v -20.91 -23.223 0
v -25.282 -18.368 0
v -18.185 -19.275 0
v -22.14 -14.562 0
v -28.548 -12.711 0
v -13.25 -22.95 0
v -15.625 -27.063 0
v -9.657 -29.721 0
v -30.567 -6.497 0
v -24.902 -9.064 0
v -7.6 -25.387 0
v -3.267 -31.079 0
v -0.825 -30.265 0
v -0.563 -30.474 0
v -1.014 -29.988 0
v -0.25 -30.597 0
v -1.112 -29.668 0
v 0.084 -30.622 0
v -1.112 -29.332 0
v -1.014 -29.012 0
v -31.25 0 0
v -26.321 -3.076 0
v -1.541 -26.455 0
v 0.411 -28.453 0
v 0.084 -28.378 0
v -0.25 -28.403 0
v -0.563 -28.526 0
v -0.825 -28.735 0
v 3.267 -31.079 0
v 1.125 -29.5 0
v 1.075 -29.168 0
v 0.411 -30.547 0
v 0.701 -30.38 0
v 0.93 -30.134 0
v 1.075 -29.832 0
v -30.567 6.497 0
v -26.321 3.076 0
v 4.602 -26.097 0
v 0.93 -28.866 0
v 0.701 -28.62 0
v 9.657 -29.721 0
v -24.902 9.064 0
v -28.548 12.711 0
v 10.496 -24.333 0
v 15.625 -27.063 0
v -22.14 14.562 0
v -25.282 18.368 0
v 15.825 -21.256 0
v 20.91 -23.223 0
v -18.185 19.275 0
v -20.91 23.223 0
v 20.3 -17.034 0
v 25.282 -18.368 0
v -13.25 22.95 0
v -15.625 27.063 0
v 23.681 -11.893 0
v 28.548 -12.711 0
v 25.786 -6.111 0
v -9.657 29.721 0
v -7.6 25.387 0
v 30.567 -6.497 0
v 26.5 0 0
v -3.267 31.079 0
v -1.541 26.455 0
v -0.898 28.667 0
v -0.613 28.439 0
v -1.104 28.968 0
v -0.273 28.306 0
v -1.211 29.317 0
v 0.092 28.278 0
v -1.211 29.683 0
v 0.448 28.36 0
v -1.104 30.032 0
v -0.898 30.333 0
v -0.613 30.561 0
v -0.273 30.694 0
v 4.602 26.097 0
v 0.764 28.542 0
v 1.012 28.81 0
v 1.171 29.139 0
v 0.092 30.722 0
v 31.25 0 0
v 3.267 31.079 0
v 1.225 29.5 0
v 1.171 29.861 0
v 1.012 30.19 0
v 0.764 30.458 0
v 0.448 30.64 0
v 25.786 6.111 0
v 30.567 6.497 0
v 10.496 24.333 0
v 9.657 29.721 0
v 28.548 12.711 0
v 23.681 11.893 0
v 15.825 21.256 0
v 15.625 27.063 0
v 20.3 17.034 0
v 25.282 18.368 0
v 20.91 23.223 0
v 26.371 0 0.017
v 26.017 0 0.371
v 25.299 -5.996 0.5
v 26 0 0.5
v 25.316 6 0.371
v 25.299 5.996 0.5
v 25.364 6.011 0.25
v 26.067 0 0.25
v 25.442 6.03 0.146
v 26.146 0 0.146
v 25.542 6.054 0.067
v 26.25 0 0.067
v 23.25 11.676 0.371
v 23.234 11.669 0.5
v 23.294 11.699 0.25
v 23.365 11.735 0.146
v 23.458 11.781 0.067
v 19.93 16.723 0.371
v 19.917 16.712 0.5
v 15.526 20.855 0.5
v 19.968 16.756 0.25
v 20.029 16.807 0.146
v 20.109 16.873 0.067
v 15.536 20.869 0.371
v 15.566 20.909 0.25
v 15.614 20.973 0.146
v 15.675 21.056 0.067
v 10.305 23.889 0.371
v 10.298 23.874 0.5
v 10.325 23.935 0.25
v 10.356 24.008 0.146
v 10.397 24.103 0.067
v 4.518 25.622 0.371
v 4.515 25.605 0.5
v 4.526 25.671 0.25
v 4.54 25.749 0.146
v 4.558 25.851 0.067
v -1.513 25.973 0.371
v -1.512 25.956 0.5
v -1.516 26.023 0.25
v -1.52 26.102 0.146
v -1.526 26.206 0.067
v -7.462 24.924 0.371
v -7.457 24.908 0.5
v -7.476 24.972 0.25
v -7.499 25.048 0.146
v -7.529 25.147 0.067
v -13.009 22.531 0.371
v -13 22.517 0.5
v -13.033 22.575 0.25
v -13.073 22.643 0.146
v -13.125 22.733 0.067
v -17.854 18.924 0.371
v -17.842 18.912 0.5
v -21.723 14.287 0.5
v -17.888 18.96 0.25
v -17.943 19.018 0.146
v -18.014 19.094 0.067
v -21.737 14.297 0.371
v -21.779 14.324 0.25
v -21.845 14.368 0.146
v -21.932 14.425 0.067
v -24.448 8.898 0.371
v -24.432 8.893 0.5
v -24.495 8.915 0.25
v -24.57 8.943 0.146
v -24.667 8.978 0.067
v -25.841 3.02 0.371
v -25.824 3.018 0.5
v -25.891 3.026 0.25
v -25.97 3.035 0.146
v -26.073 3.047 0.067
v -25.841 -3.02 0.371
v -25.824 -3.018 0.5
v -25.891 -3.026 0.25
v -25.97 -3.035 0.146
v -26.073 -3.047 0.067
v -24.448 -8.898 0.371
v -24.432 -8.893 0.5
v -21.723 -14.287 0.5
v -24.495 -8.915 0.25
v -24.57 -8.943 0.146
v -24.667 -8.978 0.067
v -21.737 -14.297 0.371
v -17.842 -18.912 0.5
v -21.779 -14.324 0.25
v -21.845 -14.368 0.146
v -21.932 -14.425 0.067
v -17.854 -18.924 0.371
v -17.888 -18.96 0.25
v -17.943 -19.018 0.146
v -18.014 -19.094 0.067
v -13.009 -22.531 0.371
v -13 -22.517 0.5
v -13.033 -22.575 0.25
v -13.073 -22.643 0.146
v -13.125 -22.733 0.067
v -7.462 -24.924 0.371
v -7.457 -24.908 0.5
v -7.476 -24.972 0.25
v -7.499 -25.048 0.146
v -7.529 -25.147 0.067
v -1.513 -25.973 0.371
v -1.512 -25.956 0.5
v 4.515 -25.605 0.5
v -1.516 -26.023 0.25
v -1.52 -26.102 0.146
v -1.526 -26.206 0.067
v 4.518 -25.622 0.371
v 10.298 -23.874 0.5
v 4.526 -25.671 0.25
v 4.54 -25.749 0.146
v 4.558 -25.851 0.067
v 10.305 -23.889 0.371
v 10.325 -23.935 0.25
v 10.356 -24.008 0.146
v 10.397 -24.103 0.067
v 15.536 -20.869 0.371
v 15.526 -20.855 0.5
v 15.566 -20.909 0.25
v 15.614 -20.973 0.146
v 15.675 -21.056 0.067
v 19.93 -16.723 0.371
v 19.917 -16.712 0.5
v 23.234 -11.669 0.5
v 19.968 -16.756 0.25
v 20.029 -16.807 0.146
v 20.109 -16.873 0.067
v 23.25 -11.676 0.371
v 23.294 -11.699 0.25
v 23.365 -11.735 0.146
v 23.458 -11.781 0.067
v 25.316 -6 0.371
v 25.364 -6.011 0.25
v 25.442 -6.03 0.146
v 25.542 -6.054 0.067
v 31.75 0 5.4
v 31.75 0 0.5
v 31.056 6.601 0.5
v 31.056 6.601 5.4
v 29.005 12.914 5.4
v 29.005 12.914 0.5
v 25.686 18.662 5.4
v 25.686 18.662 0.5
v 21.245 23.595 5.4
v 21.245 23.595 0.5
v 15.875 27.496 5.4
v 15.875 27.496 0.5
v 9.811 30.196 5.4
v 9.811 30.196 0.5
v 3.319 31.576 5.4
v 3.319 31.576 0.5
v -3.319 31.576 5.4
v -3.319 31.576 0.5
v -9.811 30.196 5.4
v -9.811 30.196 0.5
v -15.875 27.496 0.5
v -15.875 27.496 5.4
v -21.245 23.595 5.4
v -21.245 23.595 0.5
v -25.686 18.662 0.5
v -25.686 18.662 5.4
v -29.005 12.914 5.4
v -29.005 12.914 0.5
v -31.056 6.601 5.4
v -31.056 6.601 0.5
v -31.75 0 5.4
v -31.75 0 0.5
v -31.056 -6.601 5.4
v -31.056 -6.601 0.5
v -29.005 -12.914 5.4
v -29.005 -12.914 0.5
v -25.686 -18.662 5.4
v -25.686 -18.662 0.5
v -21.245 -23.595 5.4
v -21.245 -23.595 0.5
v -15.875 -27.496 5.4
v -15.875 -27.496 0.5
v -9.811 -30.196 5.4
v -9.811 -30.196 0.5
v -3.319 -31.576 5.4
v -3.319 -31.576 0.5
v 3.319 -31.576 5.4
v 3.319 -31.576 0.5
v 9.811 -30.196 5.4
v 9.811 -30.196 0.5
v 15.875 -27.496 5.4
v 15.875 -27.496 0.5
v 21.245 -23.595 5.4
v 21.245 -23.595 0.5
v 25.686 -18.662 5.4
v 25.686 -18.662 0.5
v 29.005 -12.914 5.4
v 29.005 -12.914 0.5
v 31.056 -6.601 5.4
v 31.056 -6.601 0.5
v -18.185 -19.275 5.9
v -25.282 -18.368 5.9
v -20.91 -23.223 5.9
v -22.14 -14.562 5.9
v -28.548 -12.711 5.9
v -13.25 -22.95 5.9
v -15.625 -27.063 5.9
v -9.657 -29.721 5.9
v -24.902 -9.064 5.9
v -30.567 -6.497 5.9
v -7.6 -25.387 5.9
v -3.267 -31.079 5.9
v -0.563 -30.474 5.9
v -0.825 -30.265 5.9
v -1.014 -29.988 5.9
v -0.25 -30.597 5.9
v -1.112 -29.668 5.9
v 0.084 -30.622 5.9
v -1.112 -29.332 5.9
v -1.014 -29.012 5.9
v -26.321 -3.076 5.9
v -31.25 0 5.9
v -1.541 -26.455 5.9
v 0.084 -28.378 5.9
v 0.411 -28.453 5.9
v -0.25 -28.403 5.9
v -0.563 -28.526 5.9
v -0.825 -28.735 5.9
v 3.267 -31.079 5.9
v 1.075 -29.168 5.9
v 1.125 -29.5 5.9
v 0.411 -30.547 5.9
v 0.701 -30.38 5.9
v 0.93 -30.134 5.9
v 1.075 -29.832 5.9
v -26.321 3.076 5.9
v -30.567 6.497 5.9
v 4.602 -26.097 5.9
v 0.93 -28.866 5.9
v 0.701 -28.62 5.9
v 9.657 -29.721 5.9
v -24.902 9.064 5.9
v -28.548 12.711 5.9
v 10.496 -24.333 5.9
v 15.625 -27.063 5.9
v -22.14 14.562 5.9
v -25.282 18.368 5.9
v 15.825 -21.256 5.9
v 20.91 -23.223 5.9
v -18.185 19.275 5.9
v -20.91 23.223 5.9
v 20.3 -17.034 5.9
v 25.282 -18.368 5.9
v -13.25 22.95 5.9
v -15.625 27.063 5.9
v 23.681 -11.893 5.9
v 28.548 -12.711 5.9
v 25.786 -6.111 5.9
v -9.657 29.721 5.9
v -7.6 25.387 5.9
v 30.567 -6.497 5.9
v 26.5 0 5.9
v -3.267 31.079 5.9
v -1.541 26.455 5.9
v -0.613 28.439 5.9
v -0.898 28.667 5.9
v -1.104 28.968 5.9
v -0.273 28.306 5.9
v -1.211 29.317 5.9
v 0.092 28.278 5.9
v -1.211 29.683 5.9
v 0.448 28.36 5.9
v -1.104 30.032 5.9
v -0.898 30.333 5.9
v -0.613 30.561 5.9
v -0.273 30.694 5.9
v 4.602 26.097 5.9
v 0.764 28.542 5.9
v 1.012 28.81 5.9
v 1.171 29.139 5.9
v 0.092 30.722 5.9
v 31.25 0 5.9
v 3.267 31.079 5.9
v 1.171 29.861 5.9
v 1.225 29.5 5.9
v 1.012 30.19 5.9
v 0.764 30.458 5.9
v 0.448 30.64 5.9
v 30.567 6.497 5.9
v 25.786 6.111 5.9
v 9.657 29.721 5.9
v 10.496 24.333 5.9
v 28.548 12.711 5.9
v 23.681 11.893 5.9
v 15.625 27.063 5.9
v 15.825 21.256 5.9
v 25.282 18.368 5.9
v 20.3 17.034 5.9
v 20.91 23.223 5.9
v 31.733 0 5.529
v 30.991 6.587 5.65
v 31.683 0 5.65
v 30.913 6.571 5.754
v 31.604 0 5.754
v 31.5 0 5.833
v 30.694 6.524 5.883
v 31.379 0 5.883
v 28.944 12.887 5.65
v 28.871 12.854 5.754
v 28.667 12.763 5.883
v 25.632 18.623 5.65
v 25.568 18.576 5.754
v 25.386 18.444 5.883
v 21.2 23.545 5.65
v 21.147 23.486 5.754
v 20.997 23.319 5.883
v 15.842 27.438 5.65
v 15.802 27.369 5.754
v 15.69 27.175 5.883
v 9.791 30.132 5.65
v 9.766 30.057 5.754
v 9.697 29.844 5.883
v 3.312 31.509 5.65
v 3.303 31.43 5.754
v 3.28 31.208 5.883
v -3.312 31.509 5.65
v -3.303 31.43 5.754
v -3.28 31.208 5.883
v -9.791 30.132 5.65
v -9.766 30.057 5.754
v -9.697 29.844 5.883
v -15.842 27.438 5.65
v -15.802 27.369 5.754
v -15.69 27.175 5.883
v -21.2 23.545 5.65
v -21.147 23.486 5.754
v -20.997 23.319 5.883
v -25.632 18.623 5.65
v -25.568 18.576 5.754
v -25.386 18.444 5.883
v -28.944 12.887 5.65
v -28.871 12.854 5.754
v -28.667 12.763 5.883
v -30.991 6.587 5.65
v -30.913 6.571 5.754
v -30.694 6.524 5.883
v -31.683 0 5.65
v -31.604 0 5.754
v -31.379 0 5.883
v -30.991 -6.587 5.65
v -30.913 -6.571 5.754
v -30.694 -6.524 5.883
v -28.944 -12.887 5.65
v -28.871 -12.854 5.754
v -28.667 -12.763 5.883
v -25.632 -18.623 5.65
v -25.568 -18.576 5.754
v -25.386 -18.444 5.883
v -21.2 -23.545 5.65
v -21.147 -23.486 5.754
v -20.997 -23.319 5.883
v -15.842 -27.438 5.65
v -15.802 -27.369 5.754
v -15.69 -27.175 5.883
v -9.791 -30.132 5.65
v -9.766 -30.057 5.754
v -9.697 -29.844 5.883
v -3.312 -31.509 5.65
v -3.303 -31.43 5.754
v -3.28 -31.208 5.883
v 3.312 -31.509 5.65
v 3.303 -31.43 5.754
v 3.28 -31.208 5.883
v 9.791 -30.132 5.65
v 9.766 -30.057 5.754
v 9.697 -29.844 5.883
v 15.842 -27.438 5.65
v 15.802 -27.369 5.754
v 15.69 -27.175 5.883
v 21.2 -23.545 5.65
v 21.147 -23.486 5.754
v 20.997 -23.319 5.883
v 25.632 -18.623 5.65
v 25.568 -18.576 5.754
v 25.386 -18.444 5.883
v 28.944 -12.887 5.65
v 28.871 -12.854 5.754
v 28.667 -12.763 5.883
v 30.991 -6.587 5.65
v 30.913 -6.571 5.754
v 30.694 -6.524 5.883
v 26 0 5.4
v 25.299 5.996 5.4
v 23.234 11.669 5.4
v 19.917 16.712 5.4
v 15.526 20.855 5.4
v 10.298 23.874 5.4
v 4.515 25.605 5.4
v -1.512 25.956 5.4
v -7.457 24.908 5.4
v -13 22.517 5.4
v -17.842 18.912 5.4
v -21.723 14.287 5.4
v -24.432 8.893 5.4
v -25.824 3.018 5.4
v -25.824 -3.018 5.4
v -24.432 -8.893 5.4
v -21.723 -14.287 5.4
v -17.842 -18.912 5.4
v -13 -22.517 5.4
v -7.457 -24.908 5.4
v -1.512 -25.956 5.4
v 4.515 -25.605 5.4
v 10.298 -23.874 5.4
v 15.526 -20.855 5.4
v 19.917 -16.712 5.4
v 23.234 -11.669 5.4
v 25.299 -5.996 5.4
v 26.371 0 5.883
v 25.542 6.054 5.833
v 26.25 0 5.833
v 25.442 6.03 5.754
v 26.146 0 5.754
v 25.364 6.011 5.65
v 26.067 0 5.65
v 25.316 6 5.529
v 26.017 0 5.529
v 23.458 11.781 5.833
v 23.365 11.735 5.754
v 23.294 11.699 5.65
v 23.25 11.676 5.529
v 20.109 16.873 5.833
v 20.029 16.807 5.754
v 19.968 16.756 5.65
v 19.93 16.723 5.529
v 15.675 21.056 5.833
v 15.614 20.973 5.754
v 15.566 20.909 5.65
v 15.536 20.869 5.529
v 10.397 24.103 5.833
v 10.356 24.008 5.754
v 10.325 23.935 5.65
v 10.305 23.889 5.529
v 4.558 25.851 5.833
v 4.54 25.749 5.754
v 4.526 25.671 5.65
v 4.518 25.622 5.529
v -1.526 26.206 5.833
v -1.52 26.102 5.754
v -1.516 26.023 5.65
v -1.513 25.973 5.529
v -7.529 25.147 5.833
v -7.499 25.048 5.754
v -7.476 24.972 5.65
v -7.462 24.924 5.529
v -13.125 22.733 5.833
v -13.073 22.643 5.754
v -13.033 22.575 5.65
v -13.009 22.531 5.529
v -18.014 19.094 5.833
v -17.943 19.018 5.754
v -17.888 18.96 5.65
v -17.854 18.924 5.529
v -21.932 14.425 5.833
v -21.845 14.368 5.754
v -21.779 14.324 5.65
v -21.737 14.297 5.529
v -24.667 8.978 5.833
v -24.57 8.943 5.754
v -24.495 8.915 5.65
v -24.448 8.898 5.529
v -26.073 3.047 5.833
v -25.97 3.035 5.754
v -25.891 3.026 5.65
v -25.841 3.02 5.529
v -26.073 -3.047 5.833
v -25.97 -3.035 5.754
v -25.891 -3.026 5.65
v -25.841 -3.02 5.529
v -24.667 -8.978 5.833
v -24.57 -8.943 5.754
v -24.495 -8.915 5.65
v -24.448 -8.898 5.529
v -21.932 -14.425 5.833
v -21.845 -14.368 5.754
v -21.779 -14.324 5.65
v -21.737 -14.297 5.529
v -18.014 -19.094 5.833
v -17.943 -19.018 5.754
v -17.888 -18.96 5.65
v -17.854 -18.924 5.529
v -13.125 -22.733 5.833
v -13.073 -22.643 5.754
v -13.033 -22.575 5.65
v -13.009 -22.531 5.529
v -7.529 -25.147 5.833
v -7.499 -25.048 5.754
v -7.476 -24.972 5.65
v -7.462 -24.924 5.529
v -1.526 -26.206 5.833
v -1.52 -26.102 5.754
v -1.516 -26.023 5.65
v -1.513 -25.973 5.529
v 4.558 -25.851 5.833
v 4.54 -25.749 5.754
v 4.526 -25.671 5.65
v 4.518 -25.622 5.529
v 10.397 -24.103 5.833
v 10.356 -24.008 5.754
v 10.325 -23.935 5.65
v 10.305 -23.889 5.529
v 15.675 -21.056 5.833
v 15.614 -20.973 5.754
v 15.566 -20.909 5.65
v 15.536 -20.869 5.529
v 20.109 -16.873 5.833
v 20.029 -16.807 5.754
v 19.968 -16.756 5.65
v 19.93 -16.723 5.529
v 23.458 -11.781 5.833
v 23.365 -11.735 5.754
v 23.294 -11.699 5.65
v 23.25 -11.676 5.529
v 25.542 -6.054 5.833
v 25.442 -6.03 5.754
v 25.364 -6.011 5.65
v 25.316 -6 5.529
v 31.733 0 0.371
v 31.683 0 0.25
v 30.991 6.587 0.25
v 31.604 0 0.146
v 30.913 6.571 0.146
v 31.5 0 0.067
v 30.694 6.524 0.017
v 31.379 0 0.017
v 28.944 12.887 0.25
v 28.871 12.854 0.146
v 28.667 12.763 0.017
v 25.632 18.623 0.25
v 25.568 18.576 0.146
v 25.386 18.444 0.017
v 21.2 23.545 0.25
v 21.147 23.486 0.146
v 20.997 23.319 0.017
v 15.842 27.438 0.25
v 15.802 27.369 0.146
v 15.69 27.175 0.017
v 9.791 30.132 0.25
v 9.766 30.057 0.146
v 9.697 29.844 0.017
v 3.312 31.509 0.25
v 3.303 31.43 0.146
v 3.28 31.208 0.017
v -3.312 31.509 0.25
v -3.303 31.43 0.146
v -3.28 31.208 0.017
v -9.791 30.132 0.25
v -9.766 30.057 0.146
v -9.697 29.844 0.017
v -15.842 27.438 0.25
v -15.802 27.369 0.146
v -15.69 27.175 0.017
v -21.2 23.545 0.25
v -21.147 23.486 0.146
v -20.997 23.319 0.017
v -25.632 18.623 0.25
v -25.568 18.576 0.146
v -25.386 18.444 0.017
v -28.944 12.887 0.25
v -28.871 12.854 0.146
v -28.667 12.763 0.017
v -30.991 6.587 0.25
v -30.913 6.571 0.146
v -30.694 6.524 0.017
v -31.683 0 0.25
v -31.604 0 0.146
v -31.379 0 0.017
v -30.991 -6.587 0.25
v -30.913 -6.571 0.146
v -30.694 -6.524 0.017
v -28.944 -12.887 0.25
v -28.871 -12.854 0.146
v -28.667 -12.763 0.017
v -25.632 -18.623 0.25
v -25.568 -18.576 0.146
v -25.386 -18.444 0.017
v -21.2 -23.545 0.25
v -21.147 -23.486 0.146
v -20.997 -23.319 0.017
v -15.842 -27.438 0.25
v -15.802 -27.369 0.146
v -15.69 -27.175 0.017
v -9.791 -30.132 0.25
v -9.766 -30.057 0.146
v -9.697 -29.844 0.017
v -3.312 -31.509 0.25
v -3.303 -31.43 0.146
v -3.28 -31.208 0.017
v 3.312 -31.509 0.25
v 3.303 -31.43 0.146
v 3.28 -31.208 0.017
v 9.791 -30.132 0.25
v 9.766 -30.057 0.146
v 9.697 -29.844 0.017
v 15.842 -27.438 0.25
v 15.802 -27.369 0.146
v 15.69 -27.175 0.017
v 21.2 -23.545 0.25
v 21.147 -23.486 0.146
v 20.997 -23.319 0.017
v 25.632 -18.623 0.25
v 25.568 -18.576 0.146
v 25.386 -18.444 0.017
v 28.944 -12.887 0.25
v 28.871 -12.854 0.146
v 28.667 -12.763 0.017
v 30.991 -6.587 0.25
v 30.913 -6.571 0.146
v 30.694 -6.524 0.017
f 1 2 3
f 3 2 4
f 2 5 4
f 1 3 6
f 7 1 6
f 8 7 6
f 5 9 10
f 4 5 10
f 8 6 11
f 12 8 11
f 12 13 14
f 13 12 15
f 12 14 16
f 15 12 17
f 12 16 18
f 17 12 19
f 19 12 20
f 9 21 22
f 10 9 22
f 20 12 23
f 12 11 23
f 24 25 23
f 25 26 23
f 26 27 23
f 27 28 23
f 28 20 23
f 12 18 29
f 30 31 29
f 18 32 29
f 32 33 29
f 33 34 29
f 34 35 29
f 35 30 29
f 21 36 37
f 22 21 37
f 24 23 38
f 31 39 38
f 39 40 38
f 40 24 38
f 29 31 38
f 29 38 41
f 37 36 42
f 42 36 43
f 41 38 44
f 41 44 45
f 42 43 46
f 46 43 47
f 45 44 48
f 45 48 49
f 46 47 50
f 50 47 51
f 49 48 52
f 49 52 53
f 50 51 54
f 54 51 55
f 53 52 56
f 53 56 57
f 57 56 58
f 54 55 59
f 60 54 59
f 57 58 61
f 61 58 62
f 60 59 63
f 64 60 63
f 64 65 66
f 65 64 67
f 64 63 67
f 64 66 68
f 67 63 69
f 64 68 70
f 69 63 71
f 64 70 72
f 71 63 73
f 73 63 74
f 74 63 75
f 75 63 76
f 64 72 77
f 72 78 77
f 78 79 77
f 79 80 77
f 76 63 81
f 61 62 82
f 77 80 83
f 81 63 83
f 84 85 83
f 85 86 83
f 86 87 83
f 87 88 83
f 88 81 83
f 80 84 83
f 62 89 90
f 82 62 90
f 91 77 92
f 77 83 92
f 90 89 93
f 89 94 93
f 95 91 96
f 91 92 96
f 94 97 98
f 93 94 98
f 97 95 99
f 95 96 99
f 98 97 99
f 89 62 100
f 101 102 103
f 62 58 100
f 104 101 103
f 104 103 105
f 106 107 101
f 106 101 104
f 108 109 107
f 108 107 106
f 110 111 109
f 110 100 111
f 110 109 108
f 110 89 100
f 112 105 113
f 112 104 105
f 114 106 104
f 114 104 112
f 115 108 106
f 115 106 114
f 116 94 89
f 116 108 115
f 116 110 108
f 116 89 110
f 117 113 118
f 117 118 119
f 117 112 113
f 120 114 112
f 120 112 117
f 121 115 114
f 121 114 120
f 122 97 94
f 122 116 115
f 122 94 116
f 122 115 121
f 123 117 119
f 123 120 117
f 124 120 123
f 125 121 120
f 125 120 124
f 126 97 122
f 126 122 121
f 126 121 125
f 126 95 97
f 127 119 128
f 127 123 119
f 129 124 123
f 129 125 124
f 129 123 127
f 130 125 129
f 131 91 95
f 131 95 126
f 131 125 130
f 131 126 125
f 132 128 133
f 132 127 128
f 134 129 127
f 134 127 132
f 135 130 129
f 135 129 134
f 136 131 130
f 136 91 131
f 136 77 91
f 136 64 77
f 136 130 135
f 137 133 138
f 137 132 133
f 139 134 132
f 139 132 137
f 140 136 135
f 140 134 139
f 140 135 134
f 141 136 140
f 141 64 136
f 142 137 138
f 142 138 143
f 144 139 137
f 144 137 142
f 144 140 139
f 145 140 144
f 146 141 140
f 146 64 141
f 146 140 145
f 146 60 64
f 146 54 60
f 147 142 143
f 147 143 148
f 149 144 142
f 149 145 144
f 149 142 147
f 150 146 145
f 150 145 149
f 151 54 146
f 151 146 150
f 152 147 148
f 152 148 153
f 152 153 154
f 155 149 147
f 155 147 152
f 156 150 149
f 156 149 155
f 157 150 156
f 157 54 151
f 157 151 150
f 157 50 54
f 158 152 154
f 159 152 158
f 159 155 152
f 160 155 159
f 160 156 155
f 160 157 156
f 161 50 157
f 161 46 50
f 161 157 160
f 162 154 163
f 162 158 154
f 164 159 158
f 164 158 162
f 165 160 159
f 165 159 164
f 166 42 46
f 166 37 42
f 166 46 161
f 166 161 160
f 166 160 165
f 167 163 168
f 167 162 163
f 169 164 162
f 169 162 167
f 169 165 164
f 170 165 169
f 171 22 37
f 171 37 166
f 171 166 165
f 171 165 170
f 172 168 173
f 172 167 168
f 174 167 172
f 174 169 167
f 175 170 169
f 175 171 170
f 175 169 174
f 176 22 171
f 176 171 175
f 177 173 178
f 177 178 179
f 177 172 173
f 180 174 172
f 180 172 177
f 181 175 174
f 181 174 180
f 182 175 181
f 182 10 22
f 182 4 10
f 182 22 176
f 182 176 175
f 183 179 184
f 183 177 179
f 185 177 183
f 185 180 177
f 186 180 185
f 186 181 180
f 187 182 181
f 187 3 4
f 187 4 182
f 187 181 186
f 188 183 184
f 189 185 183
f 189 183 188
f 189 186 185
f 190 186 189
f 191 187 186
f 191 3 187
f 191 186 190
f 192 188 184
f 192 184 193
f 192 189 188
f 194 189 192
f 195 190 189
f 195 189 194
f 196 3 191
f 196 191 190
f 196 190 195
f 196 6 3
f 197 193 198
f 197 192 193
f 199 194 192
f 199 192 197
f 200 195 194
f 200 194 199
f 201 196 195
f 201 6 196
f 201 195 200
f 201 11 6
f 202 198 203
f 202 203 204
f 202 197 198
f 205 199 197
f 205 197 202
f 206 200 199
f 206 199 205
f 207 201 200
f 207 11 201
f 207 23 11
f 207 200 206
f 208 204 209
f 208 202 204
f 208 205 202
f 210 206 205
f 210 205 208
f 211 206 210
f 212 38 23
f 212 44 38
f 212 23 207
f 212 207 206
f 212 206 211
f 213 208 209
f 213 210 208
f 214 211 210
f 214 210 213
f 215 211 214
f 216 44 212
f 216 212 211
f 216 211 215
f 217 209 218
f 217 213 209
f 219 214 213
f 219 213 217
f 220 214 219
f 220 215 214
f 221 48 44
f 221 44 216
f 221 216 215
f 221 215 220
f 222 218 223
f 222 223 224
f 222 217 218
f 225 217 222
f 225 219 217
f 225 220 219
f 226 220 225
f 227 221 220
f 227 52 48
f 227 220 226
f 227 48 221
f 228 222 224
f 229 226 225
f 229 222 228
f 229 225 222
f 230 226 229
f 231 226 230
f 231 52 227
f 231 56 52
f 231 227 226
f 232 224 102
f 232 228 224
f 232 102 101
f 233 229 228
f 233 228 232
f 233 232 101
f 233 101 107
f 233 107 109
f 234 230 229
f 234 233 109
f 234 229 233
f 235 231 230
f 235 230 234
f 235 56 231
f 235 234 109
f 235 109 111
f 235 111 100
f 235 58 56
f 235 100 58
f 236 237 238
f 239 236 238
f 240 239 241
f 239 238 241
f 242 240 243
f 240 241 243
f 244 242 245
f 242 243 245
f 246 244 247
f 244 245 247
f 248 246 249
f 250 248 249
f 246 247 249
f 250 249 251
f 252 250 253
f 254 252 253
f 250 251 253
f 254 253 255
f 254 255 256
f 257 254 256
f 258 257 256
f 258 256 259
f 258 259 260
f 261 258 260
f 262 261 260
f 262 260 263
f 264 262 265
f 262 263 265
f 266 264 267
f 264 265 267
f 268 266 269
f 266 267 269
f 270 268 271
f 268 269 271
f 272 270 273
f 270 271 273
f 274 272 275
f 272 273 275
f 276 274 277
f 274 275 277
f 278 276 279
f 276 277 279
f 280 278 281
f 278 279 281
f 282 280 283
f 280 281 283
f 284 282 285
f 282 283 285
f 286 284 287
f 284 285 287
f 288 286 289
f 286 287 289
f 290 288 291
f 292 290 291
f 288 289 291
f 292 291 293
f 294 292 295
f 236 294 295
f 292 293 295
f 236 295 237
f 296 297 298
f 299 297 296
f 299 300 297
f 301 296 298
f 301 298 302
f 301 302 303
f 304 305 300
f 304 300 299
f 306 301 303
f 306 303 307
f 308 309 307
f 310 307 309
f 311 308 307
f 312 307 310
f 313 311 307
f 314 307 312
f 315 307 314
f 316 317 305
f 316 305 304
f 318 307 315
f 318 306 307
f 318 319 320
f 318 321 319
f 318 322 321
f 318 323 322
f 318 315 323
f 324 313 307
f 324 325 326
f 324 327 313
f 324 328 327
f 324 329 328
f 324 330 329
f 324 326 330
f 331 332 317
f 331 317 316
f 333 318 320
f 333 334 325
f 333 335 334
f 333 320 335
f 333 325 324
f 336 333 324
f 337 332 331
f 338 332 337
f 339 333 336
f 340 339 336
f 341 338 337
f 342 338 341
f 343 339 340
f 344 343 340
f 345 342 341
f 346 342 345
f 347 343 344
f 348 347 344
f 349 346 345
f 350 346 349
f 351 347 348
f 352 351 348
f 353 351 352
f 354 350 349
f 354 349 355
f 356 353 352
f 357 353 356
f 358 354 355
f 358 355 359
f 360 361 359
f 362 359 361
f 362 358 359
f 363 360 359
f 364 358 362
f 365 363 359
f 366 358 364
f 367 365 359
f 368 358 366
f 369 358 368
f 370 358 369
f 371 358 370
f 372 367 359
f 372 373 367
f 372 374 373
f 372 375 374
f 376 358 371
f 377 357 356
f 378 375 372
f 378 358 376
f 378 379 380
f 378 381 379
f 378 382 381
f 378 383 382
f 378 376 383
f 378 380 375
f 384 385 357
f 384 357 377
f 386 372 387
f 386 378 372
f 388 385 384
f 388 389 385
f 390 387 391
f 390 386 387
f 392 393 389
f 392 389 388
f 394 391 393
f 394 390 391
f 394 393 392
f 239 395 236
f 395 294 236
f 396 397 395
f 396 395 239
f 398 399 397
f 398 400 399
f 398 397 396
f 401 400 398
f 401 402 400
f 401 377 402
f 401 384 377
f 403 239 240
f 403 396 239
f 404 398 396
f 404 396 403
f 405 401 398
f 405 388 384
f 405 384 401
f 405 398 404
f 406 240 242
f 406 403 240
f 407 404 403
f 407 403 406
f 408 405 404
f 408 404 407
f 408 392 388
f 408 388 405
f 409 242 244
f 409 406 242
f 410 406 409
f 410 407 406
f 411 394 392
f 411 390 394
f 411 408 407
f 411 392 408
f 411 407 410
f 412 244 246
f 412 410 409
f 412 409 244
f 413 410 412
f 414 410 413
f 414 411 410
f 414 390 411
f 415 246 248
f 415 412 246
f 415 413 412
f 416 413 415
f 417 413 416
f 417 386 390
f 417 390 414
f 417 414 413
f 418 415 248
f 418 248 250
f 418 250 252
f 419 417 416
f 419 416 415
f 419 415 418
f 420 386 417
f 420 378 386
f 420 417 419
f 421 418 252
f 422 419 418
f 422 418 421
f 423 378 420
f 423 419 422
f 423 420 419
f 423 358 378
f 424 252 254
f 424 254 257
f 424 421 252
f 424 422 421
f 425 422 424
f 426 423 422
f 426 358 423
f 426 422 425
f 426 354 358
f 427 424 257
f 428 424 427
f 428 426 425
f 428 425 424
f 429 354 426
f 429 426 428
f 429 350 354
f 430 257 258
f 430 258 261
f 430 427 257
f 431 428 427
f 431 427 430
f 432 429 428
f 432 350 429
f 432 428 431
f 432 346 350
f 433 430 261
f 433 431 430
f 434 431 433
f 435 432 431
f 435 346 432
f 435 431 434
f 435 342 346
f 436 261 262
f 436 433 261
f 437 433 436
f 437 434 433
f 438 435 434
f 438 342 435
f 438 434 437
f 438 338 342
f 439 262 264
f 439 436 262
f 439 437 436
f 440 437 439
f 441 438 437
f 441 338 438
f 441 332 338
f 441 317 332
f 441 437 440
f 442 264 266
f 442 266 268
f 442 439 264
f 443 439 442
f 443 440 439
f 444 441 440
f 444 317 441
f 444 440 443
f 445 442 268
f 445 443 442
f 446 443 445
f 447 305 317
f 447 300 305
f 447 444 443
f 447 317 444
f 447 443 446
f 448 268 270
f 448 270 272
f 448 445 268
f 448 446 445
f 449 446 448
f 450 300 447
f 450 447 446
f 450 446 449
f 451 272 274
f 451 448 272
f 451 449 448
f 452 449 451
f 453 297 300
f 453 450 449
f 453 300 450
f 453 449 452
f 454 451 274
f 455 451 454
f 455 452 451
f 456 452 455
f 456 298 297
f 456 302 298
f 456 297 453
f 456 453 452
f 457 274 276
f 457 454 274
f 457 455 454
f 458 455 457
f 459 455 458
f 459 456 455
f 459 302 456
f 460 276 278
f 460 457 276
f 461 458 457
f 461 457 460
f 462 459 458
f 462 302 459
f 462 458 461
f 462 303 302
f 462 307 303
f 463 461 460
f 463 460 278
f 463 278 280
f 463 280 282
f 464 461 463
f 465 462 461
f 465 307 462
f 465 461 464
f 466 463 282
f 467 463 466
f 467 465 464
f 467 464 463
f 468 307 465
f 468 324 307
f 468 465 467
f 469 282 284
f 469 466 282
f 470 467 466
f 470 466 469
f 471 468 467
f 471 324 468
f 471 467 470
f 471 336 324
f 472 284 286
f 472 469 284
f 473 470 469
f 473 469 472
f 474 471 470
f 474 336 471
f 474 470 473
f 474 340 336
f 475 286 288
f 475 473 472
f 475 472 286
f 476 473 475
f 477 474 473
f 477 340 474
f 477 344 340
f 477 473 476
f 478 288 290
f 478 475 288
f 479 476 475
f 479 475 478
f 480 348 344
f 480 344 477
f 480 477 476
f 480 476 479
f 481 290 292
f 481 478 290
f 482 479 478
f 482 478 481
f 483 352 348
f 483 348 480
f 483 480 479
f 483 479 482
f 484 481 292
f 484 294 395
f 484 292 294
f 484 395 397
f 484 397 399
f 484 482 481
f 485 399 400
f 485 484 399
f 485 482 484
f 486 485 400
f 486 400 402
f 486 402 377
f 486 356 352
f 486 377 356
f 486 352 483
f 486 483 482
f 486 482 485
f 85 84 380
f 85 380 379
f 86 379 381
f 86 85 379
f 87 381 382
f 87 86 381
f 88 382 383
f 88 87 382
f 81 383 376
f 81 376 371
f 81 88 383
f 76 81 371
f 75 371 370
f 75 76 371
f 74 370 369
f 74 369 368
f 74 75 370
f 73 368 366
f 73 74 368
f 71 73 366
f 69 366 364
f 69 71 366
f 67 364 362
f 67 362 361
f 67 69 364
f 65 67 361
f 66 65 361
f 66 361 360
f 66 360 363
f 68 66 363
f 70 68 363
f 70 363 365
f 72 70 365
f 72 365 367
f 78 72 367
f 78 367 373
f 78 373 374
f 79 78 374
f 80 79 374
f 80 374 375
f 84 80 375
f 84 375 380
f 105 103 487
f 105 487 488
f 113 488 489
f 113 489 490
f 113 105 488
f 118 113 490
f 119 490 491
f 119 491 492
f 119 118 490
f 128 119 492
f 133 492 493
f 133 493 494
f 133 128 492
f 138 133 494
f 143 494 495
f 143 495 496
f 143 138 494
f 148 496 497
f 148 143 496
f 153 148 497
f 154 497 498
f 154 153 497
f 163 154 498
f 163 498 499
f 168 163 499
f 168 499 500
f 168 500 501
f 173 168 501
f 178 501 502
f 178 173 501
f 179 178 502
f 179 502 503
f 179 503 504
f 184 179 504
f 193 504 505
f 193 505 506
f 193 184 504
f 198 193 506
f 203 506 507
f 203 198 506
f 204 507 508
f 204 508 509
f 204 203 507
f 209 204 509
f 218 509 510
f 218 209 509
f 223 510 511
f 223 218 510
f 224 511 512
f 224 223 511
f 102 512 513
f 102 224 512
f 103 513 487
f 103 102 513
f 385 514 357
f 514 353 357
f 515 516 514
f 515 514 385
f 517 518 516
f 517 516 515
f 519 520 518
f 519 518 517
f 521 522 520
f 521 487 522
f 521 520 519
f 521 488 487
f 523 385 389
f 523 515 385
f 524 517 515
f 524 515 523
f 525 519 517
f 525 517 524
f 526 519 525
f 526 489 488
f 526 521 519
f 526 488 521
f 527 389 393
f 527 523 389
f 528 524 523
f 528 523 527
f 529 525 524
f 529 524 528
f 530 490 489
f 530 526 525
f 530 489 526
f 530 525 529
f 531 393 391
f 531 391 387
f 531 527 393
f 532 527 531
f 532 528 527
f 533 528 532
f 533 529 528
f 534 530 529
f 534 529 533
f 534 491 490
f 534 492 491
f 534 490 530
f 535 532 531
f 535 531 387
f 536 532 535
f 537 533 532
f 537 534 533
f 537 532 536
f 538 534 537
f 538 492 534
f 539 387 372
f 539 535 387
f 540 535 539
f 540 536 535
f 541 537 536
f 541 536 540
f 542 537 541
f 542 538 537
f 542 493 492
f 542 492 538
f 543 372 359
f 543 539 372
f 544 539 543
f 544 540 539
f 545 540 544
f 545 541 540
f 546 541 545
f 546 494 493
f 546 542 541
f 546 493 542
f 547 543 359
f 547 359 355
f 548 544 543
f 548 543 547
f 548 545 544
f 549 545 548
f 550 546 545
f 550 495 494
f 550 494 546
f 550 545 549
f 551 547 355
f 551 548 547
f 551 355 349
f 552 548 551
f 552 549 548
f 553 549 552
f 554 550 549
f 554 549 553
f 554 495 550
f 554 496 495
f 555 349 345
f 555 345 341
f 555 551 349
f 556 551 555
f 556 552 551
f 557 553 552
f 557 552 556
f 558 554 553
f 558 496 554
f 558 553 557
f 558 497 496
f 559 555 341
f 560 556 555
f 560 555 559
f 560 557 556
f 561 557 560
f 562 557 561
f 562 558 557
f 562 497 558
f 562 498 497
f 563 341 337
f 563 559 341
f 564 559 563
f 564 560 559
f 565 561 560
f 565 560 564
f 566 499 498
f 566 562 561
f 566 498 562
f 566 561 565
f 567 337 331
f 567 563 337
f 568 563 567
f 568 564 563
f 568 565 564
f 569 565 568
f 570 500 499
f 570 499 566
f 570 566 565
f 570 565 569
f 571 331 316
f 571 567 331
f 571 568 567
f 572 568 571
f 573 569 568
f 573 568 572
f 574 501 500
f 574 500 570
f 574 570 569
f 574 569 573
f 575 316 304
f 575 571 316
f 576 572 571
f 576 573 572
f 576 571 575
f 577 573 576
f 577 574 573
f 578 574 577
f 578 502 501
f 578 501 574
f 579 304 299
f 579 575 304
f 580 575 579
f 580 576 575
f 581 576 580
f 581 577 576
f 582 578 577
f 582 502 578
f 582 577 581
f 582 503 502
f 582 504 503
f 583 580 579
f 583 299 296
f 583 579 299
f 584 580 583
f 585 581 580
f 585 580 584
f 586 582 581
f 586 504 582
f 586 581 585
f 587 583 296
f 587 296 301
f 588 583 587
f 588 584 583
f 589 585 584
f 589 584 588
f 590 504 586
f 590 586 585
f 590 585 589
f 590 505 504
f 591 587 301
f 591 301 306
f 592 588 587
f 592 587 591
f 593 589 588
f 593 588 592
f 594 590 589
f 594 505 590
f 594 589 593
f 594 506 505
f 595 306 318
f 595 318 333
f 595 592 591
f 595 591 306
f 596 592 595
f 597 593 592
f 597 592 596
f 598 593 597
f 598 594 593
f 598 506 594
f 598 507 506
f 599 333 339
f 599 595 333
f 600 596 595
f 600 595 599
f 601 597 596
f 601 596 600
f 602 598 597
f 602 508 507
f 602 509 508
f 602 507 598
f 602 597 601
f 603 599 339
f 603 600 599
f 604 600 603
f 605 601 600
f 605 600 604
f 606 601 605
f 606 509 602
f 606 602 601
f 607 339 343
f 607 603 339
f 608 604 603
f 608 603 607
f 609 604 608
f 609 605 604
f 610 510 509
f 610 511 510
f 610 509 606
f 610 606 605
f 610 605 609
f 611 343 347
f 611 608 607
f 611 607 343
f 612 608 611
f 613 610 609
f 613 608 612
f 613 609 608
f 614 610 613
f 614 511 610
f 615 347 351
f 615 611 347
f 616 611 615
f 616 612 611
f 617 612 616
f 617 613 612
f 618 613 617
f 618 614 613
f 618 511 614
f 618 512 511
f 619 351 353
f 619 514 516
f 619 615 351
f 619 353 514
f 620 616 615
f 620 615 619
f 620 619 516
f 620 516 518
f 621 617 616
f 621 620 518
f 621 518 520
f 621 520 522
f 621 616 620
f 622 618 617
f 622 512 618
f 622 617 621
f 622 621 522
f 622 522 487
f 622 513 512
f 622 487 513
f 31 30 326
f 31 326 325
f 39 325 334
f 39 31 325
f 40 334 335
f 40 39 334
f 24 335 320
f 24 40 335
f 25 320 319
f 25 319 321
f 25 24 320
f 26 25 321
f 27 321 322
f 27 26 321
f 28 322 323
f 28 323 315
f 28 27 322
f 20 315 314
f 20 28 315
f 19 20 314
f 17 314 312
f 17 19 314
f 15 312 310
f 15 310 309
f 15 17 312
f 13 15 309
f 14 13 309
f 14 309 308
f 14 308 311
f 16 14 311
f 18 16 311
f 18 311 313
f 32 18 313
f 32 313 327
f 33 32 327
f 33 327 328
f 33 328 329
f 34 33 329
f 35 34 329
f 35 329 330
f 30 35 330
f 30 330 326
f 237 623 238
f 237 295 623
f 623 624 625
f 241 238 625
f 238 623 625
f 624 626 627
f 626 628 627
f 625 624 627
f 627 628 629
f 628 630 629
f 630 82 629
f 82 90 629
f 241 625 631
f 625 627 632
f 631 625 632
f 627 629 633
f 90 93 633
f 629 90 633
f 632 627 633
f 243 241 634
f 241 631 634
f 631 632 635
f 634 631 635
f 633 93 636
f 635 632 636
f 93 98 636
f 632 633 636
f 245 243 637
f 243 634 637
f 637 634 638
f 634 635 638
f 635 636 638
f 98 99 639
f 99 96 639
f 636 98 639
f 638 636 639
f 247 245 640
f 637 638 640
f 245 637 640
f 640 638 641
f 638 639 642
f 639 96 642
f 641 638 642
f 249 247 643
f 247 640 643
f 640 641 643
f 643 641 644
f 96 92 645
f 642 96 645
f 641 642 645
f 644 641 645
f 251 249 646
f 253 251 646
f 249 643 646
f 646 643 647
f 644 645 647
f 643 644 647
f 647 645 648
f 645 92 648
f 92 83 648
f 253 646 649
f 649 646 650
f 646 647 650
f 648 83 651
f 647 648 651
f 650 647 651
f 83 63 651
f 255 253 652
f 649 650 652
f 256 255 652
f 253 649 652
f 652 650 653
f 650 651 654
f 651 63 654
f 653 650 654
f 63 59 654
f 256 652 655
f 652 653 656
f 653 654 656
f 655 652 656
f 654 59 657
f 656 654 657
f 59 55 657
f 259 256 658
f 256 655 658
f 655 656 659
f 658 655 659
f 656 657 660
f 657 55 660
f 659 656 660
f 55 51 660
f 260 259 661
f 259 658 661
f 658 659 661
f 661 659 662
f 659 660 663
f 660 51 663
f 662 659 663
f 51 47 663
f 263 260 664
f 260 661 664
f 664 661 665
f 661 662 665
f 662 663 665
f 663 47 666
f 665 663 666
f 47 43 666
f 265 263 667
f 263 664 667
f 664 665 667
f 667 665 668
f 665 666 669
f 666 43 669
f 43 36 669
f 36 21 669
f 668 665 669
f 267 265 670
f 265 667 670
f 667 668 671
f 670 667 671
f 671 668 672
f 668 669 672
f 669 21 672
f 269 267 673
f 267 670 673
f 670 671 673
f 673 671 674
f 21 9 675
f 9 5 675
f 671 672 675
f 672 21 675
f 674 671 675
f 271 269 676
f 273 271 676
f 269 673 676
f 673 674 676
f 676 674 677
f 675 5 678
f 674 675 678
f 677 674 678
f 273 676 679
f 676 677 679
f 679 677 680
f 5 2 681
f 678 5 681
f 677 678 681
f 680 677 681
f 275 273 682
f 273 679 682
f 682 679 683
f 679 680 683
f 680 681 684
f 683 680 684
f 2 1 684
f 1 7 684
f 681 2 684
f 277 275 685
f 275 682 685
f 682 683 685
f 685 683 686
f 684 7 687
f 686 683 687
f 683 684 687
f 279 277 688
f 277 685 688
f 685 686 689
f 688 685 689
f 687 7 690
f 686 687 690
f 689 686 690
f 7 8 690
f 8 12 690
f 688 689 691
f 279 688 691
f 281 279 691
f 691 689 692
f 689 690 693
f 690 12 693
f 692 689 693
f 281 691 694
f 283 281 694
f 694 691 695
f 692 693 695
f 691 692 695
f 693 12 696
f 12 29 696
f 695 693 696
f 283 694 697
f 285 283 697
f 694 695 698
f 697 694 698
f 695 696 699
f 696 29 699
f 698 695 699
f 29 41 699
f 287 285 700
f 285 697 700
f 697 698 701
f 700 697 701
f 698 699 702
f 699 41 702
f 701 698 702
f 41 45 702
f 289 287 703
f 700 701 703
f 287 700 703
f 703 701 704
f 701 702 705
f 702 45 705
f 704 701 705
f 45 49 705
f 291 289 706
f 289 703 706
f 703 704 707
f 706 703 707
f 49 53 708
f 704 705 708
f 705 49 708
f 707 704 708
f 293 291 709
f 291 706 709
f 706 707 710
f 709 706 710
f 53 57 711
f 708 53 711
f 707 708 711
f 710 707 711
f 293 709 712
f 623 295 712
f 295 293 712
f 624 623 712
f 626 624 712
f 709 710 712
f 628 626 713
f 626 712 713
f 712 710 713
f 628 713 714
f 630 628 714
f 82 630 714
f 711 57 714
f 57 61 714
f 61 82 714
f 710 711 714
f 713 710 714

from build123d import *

# Parameters (mm, degrees)
F0_R     = 31.75
F0_R_2   = 1.125
F0_R_3   = 26
F0_R_4   = 1.225
F1_DEPTH = 5
F2_DEPTH = 5.9
F3_R     = 0.5
F4_R     = 0.5


with BuildPart() as f1:
    # F0 (on Top) → F1 (new body)
    with BuildSketch(Plane.XY):
        Circle(F0_R)
        with Locations((0, -29.5)):
            Circle(F0_R_2, mode=Mode.SUBTRACT)
        Circle(F0_R_3, mode=Mode.SUBTRACT)
        with Locations((0, 29.5)):
            Circle(F0_R_4, mode=Mode.SUBTRACT)
    extrude(amount=F1_DEPTH)

    # F0 (on Top) → F2 (join)
    with BuildSketch(Plane.XY):
        Circle(F0_R)
        with Locations((0, -29.5)):
            Circle(F0_R_2, mode=Mode.SUBTRACT)
        Circle(F0_R_3, mode=Mode.SUBTRACT)
        with Locations((0, 29.5)):
            Circle(F0_R_4, mode=Mode.SUBTRACT)
    extrude(amount=F2_DEPTH)

    # F3
    f3_edges = [f1.edges().sort_by_distance(p)[0] for p in [
        (-26, 0, 0),
        (-31.75, 0, 0),
        (-31.75, 0, 5.9),
    ]]
    fillet(f3_edges, radius=F3_R)

    # F4
    f4_edges = [f1.edges().sort_by_distance(p)[0] for p in [
        (-26, 0, 5.9),
        (-31.75, 0, 5.4),
    ]]
    fillet(f4_edges, radius=F4_R)


solid = f1.part
